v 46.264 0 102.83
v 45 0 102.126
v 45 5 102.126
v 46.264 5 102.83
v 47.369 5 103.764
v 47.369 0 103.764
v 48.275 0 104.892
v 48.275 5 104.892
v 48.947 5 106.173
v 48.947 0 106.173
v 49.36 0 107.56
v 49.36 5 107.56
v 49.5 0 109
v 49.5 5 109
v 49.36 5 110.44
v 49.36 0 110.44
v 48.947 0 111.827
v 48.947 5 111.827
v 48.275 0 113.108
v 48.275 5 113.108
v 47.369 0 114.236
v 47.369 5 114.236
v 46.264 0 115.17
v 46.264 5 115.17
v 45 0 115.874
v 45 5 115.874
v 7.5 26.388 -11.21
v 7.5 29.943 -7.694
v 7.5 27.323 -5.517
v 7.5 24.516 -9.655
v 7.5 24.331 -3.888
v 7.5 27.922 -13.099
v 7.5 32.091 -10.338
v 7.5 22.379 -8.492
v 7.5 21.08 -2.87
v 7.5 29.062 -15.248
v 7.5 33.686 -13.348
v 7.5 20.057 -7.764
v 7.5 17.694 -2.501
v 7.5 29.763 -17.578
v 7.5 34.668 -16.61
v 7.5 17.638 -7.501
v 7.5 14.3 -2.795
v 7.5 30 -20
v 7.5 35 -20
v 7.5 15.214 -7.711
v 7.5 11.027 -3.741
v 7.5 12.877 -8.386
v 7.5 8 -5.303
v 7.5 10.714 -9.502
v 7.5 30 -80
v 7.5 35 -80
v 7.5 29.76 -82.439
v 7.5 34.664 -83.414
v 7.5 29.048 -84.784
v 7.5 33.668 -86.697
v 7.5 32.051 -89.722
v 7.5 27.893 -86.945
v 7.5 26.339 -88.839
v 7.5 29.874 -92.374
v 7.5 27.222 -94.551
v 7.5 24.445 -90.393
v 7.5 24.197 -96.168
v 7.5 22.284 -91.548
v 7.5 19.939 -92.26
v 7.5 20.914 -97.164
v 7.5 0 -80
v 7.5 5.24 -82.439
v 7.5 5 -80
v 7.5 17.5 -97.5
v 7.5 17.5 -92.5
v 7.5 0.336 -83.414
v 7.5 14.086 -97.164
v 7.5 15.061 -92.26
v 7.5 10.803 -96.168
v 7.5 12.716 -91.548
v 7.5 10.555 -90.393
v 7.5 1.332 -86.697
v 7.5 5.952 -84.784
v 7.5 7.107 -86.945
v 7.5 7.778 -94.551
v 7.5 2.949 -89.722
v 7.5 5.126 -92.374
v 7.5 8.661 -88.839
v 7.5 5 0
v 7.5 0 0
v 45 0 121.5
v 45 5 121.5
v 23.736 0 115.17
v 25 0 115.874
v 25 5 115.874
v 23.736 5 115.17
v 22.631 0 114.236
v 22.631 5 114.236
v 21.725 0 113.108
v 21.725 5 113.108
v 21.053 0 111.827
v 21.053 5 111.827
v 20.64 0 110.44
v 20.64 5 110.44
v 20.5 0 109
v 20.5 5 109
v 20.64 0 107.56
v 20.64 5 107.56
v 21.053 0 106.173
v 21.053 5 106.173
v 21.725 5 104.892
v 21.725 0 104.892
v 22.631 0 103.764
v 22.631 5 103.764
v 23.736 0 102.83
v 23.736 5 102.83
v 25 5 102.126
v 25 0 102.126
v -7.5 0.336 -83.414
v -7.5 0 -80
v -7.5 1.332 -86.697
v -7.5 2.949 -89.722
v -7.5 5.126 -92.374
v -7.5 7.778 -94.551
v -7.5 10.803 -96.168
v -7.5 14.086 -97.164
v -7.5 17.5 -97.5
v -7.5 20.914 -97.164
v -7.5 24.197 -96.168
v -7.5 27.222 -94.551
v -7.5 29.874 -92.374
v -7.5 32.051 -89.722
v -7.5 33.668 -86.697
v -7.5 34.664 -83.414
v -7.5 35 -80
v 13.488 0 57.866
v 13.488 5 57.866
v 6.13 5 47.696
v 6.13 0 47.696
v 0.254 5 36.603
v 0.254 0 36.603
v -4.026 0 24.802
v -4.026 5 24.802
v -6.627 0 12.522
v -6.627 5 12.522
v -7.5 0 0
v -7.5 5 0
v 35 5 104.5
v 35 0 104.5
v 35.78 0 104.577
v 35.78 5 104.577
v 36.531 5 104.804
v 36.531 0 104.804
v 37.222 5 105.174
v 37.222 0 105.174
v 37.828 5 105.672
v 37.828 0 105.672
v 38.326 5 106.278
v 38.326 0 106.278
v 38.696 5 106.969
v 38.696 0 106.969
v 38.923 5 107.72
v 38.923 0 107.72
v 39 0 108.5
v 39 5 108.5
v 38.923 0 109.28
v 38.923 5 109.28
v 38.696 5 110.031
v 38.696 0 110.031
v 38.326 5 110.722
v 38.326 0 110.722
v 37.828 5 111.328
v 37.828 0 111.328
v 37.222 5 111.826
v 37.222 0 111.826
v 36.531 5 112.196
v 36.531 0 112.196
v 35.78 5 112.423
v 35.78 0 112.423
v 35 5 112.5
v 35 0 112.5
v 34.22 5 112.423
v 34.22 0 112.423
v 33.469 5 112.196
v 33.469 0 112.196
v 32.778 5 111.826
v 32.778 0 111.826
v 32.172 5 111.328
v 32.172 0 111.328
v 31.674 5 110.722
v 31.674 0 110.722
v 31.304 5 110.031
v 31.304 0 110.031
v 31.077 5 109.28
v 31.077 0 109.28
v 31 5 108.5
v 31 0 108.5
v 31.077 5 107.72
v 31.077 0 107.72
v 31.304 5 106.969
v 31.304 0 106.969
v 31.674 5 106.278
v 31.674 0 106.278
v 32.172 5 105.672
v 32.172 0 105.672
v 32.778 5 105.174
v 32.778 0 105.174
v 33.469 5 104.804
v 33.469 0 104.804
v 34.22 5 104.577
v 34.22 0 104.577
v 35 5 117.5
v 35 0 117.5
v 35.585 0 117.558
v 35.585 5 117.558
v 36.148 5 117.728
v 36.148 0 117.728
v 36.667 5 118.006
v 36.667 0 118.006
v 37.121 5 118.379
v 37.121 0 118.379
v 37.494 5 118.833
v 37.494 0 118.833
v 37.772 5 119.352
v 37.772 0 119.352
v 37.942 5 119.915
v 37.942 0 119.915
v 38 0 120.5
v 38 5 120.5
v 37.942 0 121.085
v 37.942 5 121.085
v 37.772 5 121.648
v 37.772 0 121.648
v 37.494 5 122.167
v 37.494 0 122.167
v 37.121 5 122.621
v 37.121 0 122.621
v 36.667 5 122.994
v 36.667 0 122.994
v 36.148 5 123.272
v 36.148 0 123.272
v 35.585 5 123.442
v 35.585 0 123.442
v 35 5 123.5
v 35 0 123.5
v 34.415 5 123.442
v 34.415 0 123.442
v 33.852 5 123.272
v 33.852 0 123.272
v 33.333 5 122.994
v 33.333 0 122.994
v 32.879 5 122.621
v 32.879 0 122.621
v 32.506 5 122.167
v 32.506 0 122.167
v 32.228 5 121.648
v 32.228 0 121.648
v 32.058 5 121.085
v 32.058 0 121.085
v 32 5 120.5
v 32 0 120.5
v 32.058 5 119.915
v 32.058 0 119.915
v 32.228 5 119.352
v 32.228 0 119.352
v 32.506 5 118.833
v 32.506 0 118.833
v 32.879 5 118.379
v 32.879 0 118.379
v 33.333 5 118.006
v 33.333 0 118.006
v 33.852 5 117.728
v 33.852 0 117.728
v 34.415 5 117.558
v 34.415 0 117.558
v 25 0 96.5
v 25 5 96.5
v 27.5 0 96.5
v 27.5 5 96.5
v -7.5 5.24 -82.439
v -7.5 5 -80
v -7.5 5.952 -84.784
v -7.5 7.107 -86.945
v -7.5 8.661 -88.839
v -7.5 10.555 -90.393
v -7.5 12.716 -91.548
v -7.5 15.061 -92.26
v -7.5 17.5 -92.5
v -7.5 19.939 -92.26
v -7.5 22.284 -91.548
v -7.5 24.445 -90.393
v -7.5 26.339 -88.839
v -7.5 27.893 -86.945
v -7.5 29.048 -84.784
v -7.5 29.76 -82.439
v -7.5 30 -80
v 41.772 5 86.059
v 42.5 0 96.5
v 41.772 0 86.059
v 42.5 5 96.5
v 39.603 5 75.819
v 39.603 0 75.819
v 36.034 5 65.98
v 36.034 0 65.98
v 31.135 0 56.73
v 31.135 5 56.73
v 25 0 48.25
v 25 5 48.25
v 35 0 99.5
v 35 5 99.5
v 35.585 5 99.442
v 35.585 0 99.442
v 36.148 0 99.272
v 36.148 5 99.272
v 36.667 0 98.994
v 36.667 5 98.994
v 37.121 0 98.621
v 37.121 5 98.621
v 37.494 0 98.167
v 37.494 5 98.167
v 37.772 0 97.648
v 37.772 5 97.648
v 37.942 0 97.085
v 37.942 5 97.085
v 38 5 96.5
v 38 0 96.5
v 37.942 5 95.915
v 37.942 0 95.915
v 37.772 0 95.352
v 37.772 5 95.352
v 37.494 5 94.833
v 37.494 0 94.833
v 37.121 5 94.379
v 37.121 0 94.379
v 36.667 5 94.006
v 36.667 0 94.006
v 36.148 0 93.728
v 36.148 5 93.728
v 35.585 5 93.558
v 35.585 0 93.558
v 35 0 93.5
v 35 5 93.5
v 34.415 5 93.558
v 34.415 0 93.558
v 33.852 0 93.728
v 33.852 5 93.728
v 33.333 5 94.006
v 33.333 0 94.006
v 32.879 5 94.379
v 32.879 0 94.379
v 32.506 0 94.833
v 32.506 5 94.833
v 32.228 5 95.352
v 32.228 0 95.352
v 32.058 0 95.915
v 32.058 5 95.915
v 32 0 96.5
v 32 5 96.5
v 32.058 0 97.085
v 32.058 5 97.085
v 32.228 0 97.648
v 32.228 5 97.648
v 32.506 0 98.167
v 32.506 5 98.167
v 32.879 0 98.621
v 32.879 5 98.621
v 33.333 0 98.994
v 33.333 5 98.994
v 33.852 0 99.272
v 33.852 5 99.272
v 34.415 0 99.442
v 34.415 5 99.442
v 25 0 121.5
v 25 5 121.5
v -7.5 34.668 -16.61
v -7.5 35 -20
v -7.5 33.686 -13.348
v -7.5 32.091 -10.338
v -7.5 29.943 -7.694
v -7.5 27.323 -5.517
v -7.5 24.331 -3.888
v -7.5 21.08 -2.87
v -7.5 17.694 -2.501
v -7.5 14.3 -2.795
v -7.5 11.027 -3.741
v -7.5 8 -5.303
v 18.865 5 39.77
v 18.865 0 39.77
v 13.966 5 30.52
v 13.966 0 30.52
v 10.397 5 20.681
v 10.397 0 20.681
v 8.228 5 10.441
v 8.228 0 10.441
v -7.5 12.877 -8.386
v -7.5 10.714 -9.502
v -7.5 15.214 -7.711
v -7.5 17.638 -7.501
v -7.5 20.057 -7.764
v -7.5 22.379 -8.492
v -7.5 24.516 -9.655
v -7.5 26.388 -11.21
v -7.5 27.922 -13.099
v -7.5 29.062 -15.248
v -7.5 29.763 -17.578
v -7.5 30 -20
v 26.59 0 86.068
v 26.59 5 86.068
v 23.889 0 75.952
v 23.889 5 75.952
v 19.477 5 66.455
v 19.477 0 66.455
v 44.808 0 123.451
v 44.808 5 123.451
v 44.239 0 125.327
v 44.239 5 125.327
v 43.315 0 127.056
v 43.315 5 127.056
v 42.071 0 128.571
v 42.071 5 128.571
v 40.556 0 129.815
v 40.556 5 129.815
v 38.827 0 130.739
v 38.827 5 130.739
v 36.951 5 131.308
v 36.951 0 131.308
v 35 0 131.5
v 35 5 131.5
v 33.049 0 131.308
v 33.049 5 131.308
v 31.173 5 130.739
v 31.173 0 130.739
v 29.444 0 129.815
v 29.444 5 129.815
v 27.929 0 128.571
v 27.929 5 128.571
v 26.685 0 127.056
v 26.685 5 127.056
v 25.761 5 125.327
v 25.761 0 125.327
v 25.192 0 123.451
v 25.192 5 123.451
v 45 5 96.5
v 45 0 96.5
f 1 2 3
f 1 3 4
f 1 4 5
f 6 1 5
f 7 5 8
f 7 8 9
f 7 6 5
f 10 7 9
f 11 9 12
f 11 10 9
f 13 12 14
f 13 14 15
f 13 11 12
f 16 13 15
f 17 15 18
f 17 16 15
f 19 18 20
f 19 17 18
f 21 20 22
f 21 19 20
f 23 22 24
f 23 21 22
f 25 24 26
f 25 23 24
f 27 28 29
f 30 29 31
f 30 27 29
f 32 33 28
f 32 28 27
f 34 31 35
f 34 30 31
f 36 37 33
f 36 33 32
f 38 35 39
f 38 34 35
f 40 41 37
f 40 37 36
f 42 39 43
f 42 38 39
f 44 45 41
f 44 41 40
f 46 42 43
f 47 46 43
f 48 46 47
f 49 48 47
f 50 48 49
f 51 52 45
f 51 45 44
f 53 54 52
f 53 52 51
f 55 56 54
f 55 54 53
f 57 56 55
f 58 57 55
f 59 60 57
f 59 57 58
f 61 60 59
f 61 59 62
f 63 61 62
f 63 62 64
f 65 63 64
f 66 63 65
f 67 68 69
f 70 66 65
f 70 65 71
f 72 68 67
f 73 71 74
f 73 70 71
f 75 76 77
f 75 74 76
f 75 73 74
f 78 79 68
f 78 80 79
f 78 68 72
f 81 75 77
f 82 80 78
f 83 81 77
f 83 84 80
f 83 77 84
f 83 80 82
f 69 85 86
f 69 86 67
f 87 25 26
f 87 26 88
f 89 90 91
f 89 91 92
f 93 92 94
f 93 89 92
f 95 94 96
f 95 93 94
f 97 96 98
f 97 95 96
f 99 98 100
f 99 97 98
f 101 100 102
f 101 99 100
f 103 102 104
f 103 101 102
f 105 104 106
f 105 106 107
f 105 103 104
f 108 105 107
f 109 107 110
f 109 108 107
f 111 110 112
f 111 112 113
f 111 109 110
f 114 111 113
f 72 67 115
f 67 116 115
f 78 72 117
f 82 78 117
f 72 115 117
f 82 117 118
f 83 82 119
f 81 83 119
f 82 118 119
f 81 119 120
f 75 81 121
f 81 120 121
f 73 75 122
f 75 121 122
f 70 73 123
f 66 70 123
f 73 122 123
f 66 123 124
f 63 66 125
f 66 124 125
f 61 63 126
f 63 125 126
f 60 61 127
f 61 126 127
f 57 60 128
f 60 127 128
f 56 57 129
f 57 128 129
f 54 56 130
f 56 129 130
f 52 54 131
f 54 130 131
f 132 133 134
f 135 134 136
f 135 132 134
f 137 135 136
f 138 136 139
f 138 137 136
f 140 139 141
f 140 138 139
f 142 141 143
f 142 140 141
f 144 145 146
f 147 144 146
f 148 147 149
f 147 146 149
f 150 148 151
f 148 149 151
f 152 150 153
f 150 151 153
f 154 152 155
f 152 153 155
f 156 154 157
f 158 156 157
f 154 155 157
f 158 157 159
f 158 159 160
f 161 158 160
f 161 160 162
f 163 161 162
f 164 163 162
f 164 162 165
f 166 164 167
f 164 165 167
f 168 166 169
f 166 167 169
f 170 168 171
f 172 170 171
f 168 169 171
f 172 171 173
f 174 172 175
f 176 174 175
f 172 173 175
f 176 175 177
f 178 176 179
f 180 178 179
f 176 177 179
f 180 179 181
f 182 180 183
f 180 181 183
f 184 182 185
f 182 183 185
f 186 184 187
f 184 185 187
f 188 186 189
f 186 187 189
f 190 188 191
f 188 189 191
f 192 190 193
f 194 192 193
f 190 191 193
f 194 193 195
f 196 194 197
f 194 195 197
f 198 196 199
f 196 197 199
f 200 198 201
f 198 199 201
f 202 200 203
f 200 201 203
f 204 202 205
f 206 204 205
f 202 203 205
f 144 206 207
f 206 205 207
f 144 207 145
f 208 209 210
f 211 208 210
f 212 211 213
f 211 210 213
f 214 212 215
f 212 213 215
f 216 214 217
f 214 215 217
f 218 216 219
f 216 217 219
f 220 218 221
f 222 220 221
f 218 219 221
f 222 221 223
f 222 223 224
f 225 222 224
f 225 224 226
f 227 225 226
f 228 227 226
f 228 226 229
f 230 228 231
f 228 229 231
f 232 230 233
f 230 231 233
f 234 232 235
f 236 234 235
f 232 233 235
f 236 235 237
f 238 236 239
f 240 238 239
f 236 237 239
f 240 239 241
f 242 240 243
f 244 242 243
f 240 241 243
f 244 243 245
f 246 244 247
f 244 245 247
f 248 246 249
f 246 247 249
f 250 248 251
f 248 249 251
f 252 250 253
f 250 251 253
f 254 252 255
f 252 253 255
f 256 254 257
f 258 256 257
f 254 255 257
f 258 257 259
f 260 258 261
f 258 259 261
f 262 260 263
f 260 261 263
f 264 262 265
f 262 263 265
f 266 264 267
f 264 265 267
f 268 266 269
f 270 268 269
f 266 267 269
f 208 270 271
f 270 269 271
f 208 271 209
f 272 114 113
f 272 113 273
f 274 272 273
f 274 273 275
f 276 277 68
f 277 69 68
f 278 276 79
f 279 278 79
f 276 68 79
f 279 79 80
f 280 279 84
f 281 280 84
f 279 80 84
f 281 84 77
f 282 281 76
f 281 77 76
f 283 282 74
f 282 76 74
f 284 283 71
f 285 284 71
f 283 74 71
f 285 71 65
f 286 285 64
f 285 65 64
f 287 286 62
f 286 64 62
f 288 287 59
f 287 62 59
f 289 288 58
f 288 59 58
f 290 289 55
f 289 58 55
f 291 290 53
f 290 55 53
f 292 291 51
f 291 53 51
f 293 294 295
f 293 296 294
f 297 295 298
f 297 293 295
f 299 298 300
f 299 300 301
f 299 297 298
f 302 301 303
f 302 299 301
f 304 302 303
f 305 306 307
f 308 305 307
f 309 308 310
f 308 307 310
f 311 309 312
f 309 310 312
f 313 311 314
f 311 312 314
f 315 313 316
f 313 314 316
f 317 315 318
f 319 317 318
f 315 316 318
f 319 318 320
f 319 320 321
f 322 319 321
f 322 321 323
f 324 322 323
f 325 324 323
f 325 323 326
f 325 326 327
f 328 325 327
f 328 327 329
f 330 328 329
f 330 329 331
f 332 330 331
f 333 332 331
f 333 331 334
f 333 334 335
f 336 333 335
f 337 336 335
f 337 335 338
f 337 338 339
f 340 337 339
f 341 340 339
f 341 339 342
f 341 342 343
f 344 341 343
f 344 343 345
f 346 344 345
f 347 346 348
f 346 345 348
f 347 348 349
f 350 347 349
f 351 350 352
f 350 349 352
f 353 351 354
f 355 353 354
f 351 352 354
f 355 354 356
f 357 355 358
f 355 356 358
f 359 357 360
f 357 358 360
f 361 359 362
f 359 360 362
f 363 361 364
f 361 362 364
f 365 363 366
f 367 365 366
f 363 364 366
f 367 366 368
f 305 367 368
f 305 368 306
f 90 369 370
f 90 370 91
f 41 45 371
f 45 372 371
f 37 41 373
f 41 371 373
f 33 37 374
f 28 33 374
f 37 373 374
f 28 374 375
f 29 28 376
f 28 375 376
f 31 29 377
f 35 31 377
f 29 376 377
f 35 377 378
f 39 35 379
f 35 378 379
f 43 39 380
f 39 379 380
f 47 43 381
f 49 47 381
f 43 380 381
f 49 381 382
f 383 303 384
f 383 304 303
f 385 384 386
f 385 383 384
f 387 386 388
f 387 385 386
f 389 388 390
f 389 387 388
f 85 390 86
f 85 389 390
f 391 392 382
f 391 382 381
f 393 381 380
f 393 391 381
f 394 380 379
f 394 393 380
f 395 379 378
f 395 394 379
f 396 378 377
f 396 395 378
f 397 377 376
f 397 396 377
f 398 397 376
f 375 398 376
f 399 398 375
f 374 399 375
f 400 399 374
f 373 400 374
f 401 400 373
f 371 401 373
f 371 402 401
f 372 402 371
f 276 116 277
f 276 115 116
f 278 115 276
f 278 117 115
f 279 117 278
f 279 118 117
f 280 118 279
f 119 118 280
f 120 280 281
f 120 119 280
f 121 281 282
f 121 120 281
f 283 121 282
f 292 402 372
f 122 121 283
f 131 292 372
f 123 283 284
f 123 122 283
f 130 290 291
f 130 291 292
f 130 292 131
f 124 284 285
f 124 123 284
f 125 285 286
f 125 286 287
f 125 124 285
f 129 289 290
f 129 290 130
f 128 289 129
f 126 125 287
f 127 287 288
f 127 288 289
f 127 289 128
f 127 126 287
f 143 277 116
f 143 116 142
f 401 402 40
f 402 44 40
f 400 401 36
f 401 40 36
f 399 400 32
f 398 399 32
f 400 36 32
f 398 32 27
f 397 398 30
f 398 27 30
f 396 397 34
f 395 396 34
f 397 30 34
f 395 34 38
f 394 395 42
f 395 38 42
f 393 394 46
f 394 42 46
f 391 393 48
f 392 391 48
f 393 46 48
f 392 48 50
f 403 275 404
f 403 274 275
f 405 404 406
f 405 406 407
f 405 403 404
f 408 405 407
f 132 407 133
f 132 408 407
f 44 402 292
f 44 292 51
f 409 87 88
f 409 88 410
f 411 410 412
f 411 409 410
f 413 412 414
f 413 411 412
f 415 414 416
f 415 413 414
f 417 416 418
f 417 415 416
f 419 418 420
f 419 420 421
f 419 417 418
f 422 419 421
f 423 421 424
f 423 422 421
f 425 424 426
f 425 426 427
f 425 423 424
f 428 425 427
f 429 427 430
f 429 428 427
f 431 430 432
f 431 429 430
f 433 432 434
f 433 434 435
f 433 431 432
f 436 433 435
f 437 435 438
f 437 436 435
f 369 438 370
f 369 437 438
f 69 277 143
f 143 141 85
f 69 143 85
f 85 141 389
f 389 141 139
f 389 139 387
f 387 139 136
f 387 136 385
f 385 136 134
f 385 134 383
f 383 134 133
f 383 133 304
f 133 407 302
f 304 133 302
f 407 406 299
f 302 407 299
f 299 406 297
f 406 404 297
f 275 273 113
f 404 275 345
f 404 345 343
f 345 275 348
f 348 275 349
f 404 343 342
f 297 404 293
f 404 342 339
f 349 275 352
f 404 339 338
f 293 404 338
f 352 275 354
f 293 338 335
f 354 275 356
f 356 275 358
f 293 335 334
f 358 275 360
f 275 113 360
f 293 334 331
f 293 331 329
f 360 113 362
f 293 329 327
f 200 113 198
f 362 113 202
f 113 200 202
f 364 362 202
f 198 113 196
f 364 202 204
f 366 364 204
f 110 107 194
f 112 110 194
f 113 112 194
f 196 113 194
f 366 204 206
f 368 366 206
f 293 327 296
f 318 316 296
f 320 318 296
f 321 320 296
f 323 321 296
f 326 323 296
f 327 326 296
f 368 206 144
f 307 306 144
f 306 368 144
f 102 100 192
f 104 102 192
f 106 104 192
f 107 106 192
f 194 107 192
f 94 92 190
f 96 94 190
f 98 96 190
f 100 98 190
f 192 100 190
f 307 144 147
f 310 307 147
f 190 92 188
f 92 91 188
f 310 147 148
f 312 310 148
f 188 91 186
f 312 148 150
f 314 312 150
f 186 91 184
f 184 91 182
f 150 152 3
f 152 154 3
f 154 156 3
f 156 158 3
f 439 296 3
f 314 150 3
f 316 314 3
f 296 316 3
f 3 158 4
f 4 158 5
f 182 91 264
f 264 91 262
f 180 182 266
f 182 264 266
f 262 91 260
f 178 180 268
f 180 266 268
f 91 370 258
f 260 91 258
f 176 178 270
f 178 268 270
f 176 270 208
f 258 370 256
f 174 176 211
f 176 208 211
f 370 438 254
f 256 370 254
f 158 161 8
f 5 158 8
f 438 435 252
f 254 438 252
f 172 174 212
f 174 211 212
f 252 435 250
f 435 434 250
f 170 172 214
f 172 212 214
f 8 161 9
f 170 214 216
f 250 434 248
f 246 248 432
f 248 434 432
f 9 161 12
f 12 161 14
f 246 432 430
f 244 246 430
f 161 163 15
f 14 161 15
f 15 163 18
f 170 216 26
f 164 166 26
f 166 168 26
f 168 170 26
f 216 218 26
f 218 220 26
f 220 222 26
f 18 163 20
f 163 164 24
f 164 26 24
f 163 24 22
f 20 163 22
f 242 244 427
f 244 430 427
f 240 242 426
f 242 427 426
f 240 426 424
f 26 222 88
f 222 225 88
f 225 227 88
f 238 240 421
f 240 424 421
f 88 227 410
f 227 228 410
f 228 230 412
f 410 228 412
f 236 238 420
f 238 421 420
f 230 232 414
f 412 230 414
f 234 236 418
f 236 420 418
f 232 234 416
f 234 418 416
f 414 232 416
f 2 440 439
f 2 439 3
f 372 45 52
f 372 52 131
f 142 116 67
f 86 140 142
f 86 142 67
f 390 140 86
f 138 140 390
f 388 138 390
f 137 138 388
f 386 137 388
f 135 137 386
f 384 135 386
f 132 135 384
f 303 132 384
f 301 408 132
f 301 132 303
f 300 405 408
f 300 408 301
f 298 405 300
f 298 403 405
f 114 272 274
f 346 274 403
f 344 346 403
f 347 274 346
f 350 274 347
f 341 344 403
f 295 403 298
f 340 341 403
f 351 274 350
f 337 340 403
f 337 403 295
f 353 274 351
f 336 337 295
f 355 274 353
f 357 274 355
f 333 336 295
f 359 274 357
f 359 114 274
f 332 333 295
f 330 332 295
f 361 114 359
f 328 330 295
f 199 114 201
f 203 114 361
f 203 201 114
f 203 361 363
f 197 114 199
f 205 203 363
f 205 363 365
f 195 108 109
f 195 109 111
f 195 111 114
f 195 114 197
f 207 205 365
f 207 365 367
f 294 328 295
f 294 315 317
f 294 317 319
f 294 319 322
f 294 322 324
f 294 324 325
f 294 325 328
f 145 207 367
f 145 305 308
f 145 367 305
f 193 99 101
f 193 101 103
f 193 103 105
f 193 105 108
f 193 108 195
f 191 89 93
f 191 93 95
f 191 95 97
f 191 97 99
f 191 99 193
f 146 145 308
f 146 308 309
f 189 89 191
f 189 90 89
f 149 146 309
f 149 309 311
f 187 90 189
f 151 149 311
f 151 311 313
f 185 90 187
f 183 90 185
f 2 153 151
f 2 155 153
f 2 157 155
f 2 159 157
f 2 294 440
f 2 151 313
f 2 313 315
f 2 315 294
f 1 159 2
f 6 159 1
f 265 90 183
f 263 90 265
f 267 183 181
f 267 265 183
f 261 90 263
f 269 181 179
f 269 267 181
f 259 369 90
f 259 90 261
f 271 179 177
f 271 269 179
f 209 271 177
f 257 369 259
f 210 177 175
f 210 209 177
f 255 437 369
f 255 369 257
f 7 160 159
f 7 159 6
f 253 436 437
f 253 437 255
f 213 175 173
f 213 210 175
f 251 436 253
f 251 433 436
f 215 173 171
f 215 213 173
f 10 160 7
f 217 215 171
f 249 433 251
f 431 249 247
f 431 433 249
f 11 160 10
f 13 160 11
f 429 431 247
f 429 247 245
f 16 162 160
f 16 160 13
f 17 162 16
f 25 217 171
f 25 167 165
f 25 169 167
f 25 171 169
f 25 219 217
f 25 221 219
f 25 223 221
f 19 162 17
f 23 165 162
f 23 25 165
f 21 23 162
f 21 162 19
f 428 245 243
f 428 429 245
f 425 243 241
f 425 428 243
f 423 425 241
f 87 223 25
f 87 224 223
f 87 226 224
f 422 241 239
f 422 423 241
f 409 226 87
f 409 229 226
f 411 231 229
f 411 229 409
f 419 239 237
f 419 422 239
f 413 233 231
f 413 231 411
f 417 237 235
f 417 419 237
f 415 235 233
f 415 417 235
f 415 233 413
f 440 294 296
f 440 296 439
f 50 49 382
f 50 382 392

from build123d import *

# Parameters (mm, degrees)
SCHIZZO2_W                   = 15
SCHIZZO2_H                   = 5
SCHIZZO5_W                   = 15
SCHIZZO5_H                   = 5
SCHIZZO9_R                   = 3
SCHIZZO9_R_2                 = 4
ESTRUSIONE_ESTRUSIONE1_DEPTH = 5
SCHIZZO10_R                  = 3
TAGLIO_ESTRUSIONE1_DEPTH     = 144.674980425


with BuildPart() as part:
    # Sweep1: sweep along a path in Schizzo1
    with BuildLine(Plane.ZY) as sweep1_path:
        Line((0, 0), (-80, 0))
        ThreePointArc((-80, 0), (-97.5, 17.5), (-80, 35))
        Line((-80, 35), (-20, 35))
        ThreePointArc((-20, 35), (-4.629573851, 25.866600265), (-5.303061543, 8))
    # Schizzo2 → Sweep1 (sweep)
    with BuildSketch(Plane(origin=(0, 0, 0), x_dir=(-1, 0, 0), z_dir=(0, 0, -1))):
        with Locations((0, 2.5)):
            Rectangle(SCHIZZO2_W, SCHIZZO2_H)
    sweep(path=sweep1_path.line)

    # Sweep2: sweep along a path in Schizzo3
    with BuildLine(Plane.XZ) as sweep2_path:
        ThreePointArc((42.5, 96.5), (37.98987096, 70.837222968), (25, 48.25))
        ThreePointArc((25, 48.25), (12.01012904, 25.662777032), (7.5, 0))
    # Schizzo5 → Sweep2 (sweep)
    with BuildSketch(Plane.XY):
        with Locations((0, 2.5)):
            Rectangle(SCHIZZO5_W, SCHIZZO5_H)
    sweep(path=sweep2_path.line)

    # Schizzo9 → Estrusione-Estrusione1 (add)
    with BuildSketch(Plane.XZ):
        with BuildLine():
            Line((25, 96.5), (45, 96.5))
            Line((45, 96.5), (45, 102.126136458))
            ThreePointArc((45, 102.126136458), (49.5, 109), (45, 115.873863542))
            Line((45, 115.873863542), (45, 121.5))
            ThreePointArc((45, 121.5), (35, 131.5), (25, 121.5))
            Line((25, 121.5), (25, 115.873863542))
            ThreePointArc((25, 115.873863542), (20.5, 109), (25, 102.126136458))
            Line((25, 102.126136458), (25, 96.5))
        make_face()
        with Locations(Location((35, 120.5, 0), (0, 0, 270))):
            Circle(SCHIZZO9_R, mode=Mode.SUBTRACT)
        with Locations(Location((35, 108.5, 0), (0, 0, 270))):
            Circle(SCHIZZO9_R_2, mode=Mode.SUBTRACT)
    extrude(amount=-ESTRUSIONE_ESTRUSIONE1_DEPTH)

    # Schizzo10 → Taglio-Estrusione1 (cut, through all)
    with BuildSketch(Plane(origin=(0, 5, 0), x_dir=(1, 0, 0), z_dir=(0, 1, 0))):
        with Locations(Location((35, -96.5, 0), (0, 0, 270))):
            Circle(SCHIZZO10_R)
    extrude(amount=-TAGLIO_ESTRUSIONE1_DEPTH, mode=Mode.SUBTRACT)


solid = part.part
